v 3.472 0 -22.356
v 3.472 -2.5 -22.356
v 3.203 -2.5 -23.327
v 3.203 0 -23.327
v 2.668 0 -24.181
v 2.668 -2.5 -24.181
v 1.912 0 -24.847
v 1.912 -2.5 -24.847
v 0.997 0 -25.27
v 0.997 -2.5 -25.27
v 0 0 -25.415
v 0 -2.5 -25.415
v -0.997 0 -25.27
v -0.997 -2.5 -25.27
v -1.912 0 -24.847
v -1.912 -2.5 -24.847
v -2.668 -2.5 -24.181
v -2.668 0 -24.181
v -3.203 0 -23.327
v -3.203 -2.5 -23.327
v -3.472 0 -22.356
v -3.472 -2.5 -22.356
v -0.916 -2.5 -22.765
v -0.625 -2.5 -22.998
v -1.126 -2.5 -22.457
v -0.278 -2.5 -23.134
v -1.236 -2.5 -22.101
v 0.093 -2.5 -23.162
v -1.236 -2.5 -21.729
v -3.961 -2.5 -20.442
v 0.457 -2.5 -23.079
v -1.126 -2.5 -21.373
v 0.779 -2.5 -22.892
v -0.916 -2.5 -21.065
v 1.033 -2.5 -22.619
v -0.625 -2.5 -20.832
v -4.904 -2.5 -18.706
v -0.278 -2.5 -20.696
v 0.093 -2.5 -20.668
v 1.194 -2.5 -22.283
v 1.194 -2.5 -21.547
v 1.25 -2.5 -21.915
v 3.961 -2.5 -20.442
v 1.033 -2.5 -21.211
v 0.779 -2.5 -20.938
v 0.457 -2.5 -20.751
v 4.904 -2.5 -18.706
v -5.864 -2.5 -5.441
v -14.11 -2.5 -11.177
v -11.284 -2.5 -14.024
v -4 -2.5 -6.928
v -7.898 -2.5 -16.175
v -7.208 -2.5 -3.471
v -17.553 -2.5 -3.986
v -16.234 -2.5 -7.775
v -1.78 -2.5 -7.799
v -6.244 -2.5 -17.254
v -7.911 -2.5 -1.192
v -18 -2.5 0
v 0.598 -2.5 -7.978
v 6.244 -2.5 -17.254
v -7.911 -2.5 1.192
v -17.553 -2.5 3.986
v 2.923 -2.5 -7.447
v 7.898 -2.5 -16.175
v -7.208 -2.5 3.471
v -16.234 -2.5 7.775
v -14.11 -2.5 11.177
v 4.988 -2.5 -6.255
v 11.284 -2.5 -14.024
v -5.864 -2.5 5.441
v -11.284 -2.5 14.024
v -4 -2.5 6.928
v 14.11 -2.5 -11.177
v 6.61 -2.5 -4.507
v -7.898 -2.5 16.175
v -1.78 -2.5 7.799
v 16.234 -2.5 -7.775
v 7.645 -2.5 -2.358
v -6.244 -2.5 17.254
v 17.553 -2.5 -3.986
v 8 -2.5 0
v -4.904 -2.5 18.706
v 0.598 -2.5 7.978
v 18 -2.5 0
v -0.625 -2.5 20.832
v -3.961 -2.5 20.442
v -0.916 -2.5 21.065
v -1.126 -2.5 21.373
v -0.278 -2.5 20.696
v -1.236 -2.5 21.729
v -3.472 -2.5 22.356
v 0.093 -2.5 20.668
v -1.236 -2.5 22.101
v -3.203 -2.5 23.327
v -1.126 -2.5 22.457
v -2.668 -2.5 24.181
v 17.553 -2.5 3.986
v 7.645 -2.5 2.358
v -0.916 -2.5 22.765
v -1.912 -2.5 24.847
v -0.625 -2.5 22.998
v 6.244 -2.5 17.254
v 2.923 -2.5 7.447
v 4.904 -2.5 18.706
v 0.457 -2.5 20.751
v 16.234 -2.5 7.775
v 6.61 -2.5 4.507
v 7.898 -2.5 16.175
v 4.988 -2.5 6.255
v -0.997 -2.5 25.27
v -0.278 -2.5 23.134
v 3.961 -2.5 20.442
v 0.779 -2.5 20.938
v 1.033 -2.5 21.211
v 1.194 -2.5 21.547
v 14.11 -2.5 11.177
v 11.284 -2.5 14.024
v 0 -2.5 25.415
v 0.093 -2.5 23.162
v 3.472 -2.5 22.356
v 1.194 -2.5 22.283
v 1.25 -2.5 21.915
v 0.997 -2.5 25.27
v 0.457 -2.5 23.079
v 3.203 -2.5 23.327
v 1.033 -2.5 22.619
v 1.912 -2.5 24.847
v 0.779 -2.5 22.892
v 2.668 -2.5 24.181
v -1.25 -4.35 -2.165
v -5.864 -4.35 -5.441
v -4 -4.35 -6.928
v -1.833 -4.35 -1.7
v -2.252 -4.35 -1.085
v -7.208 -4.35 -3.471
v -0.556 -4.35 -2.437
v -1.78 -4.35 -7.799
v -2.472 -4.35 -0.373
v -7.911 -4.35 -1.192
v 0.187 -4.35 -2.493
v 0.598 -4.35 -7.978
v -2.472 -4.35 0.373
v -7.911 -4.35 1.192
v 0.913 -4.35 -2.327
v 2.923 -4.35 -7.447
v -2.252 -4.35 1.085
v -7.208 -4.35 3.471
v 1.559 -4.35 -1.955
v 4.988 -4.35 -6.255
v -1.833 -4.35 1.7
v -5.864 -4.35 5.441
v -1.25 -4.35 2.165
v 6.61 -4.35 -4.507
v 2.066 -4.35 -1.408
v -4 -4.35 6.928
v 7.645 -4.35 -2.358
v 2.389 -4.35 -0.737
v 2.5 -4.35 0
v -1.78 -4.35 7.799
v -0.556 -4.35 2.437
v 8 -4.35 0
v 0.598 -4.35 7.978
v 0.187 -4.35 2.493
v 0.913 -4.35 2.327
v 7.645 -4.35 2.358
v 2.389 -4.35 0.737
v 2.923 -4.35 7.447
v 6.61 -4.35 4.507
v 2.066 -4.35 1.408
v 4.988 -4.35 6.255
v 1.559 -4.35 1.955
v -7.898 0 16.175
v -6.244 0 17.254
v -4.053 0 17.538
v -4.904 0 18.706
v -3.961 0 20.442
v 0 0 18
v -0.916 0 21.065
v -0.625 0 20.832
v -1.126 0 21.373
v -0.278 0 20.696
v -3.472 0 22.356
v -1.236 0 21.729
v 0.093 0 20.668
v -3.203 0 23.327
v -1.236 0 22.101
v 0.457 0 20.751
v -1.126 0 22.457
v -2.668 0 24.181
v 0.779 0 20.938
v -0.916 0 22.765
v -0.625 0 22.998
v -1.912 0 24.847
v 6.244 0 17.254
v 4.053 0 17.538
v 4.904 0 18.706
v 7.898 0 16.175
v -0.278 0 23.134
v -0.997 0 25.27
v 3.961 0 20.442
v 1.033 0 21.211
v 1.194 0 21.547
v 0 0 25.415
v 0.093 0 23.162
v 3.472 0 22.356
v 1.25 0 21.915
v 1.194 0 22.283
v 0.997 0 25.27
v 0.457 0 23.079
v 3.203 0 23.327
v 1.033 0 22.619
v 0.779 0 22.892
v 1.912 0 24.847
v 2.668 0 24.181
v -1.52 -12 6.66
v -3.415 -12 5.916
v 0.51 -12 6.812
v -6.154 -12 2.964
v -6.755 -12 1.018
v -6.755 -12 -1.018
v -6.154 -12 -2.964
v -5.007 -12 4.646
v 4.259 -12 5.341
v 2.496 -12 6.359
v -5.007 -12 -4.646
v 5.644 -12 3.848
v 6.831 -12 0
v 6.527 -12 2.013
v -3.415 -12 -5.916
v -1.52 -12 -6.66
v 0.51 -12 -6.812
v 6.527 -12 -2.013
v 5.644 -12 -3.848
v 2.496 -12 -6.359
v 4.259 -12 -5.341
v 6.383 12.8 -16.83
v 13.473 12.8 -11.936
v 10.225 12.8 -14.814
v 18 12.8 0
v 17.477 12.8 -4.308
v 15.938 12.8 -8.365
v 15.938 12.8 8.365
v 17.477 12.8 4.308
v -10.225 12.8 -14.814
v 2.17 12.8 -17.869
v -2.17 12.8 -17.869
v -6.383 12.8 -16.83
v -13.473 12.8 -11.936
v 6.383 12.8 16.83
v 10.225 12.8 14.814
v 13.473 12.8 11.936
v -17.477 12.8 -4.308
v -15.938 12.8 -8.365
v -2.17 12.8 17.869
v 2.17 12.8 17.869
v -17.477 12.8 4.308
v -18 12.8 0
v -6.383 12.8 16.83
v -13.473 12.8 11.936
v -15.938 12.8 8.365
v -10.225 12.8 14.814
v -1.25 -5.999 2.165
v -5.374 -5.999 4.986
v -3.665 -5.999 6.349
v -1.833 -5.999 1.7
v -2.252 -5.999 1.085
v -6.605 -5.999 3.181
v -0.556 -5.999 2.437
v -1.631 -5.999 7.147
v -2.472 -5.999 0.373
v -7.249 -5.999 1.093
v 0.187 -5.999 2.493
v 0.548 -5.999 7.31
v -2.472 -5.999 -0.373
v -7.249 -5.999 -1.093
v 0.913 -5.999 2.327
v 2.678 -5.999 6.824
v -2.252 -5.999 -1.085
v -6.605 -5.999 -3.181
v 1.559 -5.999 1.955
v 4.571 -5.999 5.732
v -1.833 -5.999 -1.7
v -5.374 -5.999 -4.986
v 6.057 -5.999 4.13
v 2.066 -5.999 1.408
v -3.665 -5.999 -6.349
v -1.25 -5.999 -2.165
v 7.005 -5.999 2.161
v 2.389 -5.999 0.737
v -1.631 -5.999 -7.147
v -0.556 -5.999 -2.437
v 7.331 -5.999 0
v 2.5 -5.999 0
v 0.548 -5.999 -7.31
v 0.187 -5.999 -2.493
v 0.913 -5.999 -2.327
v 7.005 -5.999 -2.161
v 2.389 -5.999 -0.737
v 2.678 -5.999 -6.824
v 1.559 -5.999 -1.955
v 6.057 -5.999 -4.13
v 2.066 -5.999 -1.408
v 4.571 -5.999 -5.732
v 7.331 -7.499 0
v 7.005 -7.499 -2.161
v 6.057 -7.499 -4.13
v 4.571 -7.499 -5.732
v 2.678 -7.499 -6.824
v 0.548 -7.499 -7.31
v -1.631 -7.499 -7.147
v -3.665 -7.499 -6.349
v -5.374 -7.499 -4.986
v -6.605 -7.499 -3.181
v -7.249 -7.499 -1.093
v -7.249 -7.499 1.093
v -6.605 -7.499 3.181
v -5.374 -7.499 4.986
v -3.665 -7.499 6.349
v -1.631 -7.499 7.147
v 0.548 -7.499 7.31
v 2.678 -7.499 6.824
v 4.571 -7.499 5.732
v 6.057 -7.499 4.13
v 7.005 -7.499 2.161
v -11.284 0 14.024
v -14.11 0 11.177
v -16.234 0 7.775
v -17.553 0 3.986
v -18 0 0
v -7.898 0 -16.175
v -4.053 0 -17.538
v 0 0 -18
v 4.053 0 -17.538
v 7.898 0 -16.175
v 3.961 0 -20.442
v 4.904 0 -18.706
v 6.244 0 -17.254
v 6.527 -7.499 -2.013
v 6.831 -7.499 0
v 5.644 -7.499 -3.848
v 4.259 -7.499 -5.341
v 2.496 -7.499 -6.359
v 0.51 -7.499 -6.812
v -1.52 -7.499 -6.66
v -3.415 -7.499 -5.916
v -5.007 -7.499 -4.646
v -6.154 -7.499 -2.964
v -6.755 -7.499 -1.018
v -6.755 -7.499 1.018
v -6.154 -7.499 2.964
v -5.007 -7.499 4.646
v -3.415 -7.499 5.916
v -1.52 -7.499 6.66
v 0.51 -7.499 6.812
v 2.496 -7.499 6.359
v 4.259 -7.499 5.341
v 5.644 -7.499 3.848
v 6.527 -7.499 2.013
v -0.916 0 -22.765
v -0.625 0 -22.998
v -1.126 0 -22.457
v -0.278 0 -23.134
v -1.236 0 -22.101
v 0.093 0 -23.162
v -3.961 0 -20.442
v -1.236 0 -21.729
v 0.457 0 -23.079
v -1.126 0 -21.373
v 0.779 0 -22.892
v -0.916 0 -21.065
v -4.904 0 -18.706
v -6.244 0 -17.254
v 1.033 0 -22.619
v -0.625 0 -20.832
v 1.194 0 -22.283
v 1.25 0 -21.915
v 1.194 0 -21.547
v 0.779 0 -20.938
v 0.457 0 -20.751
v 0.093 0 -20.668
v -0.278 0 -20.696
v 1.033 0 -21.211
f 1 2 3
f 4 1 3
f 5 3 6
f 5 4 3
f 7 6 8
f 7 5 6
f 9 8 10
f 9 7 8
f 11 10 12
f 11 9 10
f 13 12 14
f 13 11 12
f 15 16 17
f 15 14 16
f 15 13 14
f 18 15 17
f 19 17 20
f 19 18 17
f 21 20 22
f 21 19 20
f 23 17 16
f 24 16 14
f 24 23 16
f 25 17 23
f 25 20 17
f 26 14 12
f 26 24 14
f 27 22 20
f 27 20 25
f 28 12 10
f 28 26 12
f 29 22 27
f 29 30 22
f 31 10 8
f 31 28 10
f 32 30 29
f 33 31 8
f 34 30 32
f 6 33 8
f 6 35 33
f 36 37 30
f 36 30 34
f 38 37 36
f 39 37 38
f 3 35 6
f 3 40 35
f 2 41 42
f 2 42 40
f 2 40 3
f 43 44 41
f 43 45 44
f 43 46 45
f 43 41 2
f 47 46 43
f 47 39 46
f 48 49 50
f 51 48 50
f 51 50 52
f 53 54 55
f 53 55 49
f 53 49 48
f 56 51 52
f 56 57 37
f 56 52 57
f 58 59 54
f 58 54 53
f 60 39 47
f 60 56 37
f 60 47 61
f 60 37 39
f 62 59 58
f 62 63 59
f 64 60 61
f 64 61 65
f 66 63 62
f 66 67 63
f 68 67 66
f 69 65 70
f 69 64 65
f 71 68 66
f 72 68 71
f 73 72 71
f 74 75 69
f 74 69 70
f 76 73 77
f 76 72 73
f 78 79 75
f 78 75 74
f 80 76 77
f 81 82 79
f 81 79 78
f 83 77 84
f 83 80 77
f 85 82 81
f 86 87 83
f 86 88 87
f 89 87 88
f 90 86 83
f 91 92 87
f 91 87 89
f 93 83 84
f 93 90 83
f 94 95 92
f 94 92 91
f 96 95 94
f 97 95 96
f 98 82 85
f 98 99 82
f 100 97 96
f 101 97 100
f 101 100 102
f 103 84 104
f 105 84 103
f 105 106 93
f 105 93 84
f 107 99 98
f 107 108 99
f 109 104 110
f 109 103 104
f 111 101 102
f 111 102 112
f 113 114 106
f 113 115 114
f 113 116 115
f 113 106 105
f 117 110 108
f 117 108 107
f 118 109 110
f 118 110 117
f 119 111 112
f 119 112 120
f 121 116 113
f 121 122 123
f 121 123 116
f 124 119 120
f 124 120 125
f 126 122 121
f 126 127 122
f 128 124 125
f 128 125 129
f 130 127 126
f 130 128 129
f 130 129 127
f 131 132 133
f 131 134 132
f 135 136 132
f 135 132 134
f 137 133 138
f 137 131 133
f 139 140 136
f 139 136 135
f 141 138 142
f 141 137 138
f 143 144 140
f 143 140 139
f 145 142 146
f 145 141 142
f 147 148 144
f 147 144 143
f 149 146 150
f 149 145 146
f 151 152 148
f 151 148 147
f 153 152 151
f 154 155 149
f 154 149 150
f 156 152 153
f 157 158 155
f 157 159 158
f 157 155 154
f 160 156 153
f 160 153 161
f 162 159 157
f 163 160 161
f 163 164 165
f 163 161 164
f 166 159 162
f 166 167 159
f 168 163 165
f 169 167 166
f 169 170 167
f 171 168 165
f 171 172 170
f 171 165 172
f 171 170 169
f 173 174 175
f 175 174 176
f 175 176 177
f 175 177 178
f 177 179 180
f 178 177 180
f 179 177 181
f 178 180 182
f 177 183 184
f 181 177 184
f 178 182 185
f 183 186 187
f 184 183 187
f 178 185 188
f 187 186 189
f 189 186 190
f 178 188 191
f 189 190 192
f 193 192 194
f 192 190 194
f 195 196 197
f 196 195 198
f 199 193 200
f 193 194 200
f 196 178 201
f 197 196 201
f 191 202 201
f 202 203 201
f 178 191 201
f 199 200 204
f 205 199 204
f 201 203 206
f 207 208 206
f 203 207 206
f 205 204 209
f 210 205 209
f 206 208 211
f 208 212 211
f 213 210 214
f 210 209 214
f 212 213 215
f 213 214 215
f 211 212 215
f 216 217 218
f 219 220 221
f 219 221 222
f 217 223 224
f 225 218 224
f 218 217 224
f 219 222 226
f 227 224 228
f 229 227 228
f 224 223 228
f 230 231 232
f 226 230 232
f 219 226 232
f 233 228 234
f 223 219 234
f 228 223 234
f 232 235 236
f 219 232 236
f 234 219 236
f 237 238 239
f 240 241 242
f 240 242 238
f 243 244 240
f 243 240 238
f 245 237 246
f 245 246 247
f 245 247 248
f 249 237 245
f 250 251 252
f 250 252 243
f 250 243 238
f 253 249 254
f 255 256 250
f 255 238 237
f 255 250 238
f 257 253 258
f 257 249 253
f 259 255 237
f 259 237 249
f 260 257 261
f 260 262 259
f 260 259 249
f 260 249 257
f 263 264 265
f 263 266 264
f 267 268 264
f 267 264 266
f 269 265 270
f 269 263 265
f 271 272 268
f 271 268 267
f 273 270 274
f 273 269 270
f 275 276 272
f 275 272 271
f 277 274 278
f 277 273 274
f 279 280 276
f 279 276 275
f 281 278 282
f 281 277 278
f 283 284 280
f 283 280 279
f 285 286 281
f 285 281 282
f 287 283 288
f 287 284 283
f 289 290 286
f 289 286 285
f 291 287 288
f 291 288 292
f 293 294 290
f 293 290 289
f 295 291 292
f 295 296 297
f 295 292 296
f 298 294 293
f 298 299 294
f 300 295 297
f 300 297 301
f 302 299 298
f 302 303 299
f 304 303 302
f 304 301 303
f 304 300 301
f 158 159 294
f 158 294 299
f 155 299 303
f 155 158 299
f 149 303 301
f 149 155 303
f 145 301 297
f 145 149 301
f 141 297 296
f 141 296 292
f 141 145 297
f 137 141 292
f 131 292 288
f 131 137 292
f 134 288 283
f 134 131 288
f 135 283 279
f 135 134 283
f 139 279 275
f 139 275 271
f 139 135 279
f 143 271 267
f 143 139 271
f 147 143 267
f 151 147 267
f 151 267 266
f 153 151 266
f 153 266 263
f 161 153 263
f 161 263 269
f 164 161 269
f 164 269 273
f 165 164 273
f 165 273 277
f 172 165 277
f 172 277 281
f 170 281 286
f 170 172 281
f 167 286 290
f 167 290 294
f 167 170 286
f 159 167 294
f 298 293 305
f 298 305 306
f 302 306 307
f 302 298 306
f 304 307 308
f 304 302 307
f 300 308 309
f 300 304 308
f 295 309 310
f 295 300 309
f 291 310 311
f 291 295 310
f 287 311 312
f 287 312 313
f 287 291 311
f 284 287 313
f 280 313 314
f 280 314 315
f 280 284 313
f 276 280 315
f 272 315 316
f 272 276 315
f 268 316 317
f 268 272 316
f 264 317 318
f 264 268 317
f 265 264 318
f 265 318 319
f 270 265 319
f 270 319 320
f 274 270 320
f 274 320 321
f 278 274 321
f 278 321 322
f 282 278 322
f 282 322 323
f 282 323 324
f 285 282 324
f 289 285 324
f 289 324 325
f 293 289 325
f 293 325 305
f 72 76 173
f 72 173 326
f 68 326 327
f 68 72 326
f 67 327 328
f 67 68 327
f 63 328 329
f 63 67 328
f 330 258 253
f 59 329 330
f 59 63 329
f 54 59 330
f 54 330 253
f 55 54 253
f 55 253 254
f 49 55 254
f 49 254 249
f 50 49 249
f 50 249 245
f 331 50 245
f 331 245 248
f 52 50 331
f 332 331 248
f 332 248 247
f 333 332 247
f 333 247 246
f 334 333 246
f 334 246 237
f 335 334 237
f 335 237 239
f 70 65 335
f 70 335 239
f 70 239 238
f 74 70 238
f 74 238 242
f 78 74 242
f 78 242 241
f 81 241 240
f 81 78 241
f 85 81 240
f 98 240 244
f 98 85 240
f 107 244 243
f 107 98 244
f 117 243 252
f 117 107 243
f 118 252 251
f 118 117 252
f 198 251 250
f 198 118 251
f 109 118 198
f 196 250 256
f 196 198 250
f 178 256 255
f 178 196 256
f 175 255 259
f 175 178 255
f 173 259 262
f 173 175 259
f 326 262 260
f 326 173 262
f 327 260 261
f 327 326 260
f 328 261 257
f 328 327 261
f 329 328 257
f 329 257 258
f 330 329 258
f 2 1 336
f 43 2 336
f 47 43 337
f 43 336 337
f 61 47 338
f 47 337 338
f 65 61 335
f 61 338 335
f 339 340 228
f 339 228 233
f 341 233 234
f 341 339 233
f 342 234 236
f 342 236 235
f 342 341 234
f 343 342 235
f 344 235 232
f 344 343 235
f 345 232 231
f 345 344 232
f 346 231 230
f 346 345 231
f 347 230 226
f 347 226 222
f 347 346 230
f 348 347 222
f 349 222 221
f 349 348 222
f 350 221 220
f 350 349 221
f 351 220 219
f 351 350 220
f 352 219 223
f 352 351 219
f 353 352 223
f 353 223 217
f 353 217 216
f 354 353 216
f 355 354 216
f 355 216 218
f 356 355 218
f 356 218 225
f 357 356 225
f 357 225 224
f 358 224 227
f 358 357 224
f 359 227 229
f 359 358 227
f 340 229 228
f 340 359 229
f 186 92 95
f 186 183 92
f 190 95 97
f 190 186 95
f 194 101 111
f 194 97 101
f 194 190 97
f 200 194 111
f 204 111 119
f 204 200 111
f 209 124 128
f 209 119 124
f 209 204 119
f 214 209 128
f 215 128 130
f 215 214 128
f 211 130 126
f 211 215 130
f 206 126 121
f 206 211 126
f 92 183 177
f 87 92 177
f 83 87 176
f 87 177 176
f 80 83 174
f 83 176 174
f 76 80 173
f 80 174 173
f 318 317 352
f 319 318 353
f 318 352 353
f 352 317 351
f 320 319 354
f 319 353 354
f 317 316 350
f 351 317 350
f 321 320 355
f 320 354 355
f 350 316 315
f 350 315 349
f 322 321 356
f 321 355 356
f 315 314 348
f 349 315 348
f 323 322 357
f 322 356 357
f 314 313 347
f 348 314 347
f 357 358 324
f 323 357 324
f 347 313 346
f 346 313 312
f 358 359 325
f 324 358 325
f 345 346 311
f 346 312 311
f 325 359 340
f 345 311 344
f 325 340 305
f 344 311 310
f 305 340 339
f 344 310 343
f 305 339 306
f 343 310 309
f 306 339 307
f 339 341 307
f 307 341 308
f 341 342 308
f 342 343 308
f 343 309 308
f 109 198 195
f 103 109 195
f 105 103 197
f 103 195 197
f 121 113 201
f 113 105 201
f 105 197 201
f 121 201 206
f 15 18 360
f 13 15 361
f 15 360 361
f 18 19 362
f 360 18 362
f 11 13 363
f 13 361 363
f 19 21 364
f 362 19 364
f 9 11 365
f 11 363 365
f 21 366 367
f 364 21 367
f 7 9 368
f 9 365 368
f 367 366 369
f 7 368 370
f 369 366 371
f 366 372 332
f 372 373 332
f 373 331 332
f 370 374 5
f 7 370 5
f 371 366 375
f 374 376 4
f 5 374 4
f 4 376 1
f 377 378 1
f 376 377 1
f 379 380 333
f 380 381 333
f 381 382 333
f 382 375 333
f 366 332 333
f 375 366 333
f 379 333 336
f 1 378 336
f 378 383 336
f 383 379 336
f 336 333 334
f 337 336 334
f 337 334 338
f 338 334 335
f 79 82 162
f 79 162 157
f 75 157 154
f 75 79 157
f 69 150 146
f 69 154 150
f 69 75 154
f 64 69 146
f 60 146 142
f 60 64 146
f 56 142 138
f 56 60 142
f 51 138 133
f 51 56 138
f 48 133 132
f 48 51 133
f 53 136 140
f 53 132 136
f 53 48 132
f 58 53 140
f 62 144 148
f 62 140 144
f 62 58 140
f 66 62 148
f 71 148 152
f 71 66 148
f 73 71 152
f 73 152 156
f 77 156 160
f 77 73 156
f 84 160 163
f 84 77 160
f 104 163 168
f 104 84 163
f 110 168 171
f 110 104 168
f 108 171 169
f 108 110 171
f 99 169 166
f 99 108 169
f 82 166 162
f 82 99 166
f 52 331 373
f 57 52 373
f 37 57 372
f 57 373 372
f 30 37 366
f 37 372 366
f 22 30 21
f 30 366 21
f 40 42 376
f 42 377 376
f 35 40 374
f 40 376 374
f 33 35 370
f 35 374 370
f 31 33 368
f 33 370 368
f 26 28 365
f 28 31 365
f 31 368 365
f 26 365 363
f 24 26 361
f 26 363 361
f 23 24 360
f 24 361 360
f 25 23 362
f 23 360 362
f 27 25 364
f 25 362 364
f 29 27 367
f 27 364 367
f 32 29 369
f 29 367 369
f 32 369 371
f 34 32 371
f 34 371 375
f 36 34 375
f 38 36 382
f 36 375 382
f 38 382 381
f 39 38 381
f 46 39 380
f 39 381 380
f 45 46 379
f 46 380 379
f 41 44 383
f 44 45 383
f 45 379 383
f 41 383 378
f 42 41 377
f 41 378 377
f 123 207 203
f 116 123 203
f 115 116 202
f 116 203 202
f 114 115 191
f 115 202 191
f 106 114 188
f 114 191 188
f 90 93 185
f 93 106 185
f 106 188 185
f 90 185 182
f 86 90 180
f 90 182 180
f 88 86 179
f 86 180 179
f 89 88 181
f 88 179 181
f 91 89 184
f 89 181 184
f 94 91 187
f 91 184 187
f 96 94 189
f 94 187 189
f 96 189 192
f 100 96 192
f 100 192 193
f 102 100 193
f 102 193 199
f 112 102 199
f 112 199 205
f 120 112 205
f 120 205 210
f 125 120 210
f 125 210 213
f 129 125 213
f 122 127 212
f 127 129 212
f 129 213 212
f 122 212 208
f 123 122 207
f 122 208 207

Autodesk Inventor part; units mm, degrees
ref_plane "YZ Plane" through (0, 0, 0) normal (1, 0, 0) x (0, 1, 0)
ref_plane "XZ Plane" through (0, 0, 0) normal (0, 1, 0) x (-1, 0, 0)
sketch "스케치1" plane through (0, 0, 0) normal (0, 1, 0) x (-1, 0, 0)
  circle A0 centre (0, 0) radius 18
  dimension "d0" = 36
extrude "돌출1" add sketch "스케치1" along normal blind 12.8
sketch "스케치5" plane through (0, 0, 0) normal (0, -1, 0) x (1, 0, 0)
  arc A0 (3.4721, 22.3558) -> (-3.4721, 22.3558) centre (0, 21.915) ccw
  arc A1 (-3.4721, -22.3558) -> (3.4721, -22.3558) centre (0, -21.915) ccw
  line L0 (0, 21.915) -> (0, -21.915) construction
  circle A2 centre (0, 21.915) radius 1.25
  circle A3 centre (0, -21.915) radius 1.25
  arc A4 (3.4721, 22.3558) -> (7.8981, 16.1747) centre (11.4084, 23.3634) ccw
  arc A5 (7.8981, -16.1747) -> (3.4721, -22.3558) centre (11.4084, -23.3634) ccw
  arc A6 (-3.4721, -22.3558) -> (-7.8981, -16.1747) centre (-11.4084, -23.3634) ccw
  arc A7 (-7.8981, 16.1747) -> (-3.4721, 22.3558) centre (-11.4084, 23.3634) ccw
  circle A8 centre (0, 0) radius 18 projected
  circle A9 centre (0, 0) radius 18 projected
  dimension "d14" = 7
  dimension "d15" = 7
  dimension "d16" = 43.83
  dimension "d17" = 2.5
  dimension "d18" = 2.5
  dimension "d19" = 16
  dimension "d20" = 16
  dimension "d21" = 16
  dimension "d22" = 16
extrude "돌출4" add sketch "스케치5" along normal blind 2.5
thread "스레드1" size "M3x0.5" class "6H" standard "ANSI Metric M Profile" full length
thread "스레드2" size "M3x0.5" class "6H" standard "ANSI Metric M Profile" full length
sketch "스케치6" plane through (0, -2.5, 0) normal (0, -1, 0) x (1, 0, 0)
  circle A0 centre (0, 0) radius 8
  dimension "d29" = 16
extrude "돌출5" add sketch "스케치6" along normal blind 1.85
ref_plane "작업 평면1" through (0, -6, 0) normal (0, -1, 0) x (1, 0, 0)
sketch "스케치7" plane through (0, -4.35, 0) normal (0, -1, 0) x (1, 0, 0)
  circle A0 centre (0, 0) radius 2.5
  dimension "d33" = 5
extrude "돌출6" add sketch "스케치7" along normal blind 7.65
sketch "스케치9" plane through (0, 0, 0) normal (0, 0, 1) x (1, 0, 0)
  line L0 (-2.5, -12) -> (2.5, -12) projected
  line L1 (2.5, -12) -> (6.8309, -12)
  line L2 (6.8309, -12) -> (6.8309, -7.4987)
  line L3 (6.8309, -7.4987) -> (7.3309, -7.4987)
  line L4 (2.5, -4.35) -> (2.5, -12) projected
  line L5 (7.3309, -7.4987) -> (7.3309, -5.9987)
  line L6 (7.3309, -5.9987) -> (2.5, -5.9987)
  line L7 (0, -13.2553) -> (0, -2.7284)
  point P0 (0, 0)
  dimension "d36" = 1.5
  dimension "d37" = 0.5
revolve "회전1" add sketch "스케치9" angle 360 about axis through (0, -13.2553, 0) along (0, 1, 0)
properties part number "스텝모터"
